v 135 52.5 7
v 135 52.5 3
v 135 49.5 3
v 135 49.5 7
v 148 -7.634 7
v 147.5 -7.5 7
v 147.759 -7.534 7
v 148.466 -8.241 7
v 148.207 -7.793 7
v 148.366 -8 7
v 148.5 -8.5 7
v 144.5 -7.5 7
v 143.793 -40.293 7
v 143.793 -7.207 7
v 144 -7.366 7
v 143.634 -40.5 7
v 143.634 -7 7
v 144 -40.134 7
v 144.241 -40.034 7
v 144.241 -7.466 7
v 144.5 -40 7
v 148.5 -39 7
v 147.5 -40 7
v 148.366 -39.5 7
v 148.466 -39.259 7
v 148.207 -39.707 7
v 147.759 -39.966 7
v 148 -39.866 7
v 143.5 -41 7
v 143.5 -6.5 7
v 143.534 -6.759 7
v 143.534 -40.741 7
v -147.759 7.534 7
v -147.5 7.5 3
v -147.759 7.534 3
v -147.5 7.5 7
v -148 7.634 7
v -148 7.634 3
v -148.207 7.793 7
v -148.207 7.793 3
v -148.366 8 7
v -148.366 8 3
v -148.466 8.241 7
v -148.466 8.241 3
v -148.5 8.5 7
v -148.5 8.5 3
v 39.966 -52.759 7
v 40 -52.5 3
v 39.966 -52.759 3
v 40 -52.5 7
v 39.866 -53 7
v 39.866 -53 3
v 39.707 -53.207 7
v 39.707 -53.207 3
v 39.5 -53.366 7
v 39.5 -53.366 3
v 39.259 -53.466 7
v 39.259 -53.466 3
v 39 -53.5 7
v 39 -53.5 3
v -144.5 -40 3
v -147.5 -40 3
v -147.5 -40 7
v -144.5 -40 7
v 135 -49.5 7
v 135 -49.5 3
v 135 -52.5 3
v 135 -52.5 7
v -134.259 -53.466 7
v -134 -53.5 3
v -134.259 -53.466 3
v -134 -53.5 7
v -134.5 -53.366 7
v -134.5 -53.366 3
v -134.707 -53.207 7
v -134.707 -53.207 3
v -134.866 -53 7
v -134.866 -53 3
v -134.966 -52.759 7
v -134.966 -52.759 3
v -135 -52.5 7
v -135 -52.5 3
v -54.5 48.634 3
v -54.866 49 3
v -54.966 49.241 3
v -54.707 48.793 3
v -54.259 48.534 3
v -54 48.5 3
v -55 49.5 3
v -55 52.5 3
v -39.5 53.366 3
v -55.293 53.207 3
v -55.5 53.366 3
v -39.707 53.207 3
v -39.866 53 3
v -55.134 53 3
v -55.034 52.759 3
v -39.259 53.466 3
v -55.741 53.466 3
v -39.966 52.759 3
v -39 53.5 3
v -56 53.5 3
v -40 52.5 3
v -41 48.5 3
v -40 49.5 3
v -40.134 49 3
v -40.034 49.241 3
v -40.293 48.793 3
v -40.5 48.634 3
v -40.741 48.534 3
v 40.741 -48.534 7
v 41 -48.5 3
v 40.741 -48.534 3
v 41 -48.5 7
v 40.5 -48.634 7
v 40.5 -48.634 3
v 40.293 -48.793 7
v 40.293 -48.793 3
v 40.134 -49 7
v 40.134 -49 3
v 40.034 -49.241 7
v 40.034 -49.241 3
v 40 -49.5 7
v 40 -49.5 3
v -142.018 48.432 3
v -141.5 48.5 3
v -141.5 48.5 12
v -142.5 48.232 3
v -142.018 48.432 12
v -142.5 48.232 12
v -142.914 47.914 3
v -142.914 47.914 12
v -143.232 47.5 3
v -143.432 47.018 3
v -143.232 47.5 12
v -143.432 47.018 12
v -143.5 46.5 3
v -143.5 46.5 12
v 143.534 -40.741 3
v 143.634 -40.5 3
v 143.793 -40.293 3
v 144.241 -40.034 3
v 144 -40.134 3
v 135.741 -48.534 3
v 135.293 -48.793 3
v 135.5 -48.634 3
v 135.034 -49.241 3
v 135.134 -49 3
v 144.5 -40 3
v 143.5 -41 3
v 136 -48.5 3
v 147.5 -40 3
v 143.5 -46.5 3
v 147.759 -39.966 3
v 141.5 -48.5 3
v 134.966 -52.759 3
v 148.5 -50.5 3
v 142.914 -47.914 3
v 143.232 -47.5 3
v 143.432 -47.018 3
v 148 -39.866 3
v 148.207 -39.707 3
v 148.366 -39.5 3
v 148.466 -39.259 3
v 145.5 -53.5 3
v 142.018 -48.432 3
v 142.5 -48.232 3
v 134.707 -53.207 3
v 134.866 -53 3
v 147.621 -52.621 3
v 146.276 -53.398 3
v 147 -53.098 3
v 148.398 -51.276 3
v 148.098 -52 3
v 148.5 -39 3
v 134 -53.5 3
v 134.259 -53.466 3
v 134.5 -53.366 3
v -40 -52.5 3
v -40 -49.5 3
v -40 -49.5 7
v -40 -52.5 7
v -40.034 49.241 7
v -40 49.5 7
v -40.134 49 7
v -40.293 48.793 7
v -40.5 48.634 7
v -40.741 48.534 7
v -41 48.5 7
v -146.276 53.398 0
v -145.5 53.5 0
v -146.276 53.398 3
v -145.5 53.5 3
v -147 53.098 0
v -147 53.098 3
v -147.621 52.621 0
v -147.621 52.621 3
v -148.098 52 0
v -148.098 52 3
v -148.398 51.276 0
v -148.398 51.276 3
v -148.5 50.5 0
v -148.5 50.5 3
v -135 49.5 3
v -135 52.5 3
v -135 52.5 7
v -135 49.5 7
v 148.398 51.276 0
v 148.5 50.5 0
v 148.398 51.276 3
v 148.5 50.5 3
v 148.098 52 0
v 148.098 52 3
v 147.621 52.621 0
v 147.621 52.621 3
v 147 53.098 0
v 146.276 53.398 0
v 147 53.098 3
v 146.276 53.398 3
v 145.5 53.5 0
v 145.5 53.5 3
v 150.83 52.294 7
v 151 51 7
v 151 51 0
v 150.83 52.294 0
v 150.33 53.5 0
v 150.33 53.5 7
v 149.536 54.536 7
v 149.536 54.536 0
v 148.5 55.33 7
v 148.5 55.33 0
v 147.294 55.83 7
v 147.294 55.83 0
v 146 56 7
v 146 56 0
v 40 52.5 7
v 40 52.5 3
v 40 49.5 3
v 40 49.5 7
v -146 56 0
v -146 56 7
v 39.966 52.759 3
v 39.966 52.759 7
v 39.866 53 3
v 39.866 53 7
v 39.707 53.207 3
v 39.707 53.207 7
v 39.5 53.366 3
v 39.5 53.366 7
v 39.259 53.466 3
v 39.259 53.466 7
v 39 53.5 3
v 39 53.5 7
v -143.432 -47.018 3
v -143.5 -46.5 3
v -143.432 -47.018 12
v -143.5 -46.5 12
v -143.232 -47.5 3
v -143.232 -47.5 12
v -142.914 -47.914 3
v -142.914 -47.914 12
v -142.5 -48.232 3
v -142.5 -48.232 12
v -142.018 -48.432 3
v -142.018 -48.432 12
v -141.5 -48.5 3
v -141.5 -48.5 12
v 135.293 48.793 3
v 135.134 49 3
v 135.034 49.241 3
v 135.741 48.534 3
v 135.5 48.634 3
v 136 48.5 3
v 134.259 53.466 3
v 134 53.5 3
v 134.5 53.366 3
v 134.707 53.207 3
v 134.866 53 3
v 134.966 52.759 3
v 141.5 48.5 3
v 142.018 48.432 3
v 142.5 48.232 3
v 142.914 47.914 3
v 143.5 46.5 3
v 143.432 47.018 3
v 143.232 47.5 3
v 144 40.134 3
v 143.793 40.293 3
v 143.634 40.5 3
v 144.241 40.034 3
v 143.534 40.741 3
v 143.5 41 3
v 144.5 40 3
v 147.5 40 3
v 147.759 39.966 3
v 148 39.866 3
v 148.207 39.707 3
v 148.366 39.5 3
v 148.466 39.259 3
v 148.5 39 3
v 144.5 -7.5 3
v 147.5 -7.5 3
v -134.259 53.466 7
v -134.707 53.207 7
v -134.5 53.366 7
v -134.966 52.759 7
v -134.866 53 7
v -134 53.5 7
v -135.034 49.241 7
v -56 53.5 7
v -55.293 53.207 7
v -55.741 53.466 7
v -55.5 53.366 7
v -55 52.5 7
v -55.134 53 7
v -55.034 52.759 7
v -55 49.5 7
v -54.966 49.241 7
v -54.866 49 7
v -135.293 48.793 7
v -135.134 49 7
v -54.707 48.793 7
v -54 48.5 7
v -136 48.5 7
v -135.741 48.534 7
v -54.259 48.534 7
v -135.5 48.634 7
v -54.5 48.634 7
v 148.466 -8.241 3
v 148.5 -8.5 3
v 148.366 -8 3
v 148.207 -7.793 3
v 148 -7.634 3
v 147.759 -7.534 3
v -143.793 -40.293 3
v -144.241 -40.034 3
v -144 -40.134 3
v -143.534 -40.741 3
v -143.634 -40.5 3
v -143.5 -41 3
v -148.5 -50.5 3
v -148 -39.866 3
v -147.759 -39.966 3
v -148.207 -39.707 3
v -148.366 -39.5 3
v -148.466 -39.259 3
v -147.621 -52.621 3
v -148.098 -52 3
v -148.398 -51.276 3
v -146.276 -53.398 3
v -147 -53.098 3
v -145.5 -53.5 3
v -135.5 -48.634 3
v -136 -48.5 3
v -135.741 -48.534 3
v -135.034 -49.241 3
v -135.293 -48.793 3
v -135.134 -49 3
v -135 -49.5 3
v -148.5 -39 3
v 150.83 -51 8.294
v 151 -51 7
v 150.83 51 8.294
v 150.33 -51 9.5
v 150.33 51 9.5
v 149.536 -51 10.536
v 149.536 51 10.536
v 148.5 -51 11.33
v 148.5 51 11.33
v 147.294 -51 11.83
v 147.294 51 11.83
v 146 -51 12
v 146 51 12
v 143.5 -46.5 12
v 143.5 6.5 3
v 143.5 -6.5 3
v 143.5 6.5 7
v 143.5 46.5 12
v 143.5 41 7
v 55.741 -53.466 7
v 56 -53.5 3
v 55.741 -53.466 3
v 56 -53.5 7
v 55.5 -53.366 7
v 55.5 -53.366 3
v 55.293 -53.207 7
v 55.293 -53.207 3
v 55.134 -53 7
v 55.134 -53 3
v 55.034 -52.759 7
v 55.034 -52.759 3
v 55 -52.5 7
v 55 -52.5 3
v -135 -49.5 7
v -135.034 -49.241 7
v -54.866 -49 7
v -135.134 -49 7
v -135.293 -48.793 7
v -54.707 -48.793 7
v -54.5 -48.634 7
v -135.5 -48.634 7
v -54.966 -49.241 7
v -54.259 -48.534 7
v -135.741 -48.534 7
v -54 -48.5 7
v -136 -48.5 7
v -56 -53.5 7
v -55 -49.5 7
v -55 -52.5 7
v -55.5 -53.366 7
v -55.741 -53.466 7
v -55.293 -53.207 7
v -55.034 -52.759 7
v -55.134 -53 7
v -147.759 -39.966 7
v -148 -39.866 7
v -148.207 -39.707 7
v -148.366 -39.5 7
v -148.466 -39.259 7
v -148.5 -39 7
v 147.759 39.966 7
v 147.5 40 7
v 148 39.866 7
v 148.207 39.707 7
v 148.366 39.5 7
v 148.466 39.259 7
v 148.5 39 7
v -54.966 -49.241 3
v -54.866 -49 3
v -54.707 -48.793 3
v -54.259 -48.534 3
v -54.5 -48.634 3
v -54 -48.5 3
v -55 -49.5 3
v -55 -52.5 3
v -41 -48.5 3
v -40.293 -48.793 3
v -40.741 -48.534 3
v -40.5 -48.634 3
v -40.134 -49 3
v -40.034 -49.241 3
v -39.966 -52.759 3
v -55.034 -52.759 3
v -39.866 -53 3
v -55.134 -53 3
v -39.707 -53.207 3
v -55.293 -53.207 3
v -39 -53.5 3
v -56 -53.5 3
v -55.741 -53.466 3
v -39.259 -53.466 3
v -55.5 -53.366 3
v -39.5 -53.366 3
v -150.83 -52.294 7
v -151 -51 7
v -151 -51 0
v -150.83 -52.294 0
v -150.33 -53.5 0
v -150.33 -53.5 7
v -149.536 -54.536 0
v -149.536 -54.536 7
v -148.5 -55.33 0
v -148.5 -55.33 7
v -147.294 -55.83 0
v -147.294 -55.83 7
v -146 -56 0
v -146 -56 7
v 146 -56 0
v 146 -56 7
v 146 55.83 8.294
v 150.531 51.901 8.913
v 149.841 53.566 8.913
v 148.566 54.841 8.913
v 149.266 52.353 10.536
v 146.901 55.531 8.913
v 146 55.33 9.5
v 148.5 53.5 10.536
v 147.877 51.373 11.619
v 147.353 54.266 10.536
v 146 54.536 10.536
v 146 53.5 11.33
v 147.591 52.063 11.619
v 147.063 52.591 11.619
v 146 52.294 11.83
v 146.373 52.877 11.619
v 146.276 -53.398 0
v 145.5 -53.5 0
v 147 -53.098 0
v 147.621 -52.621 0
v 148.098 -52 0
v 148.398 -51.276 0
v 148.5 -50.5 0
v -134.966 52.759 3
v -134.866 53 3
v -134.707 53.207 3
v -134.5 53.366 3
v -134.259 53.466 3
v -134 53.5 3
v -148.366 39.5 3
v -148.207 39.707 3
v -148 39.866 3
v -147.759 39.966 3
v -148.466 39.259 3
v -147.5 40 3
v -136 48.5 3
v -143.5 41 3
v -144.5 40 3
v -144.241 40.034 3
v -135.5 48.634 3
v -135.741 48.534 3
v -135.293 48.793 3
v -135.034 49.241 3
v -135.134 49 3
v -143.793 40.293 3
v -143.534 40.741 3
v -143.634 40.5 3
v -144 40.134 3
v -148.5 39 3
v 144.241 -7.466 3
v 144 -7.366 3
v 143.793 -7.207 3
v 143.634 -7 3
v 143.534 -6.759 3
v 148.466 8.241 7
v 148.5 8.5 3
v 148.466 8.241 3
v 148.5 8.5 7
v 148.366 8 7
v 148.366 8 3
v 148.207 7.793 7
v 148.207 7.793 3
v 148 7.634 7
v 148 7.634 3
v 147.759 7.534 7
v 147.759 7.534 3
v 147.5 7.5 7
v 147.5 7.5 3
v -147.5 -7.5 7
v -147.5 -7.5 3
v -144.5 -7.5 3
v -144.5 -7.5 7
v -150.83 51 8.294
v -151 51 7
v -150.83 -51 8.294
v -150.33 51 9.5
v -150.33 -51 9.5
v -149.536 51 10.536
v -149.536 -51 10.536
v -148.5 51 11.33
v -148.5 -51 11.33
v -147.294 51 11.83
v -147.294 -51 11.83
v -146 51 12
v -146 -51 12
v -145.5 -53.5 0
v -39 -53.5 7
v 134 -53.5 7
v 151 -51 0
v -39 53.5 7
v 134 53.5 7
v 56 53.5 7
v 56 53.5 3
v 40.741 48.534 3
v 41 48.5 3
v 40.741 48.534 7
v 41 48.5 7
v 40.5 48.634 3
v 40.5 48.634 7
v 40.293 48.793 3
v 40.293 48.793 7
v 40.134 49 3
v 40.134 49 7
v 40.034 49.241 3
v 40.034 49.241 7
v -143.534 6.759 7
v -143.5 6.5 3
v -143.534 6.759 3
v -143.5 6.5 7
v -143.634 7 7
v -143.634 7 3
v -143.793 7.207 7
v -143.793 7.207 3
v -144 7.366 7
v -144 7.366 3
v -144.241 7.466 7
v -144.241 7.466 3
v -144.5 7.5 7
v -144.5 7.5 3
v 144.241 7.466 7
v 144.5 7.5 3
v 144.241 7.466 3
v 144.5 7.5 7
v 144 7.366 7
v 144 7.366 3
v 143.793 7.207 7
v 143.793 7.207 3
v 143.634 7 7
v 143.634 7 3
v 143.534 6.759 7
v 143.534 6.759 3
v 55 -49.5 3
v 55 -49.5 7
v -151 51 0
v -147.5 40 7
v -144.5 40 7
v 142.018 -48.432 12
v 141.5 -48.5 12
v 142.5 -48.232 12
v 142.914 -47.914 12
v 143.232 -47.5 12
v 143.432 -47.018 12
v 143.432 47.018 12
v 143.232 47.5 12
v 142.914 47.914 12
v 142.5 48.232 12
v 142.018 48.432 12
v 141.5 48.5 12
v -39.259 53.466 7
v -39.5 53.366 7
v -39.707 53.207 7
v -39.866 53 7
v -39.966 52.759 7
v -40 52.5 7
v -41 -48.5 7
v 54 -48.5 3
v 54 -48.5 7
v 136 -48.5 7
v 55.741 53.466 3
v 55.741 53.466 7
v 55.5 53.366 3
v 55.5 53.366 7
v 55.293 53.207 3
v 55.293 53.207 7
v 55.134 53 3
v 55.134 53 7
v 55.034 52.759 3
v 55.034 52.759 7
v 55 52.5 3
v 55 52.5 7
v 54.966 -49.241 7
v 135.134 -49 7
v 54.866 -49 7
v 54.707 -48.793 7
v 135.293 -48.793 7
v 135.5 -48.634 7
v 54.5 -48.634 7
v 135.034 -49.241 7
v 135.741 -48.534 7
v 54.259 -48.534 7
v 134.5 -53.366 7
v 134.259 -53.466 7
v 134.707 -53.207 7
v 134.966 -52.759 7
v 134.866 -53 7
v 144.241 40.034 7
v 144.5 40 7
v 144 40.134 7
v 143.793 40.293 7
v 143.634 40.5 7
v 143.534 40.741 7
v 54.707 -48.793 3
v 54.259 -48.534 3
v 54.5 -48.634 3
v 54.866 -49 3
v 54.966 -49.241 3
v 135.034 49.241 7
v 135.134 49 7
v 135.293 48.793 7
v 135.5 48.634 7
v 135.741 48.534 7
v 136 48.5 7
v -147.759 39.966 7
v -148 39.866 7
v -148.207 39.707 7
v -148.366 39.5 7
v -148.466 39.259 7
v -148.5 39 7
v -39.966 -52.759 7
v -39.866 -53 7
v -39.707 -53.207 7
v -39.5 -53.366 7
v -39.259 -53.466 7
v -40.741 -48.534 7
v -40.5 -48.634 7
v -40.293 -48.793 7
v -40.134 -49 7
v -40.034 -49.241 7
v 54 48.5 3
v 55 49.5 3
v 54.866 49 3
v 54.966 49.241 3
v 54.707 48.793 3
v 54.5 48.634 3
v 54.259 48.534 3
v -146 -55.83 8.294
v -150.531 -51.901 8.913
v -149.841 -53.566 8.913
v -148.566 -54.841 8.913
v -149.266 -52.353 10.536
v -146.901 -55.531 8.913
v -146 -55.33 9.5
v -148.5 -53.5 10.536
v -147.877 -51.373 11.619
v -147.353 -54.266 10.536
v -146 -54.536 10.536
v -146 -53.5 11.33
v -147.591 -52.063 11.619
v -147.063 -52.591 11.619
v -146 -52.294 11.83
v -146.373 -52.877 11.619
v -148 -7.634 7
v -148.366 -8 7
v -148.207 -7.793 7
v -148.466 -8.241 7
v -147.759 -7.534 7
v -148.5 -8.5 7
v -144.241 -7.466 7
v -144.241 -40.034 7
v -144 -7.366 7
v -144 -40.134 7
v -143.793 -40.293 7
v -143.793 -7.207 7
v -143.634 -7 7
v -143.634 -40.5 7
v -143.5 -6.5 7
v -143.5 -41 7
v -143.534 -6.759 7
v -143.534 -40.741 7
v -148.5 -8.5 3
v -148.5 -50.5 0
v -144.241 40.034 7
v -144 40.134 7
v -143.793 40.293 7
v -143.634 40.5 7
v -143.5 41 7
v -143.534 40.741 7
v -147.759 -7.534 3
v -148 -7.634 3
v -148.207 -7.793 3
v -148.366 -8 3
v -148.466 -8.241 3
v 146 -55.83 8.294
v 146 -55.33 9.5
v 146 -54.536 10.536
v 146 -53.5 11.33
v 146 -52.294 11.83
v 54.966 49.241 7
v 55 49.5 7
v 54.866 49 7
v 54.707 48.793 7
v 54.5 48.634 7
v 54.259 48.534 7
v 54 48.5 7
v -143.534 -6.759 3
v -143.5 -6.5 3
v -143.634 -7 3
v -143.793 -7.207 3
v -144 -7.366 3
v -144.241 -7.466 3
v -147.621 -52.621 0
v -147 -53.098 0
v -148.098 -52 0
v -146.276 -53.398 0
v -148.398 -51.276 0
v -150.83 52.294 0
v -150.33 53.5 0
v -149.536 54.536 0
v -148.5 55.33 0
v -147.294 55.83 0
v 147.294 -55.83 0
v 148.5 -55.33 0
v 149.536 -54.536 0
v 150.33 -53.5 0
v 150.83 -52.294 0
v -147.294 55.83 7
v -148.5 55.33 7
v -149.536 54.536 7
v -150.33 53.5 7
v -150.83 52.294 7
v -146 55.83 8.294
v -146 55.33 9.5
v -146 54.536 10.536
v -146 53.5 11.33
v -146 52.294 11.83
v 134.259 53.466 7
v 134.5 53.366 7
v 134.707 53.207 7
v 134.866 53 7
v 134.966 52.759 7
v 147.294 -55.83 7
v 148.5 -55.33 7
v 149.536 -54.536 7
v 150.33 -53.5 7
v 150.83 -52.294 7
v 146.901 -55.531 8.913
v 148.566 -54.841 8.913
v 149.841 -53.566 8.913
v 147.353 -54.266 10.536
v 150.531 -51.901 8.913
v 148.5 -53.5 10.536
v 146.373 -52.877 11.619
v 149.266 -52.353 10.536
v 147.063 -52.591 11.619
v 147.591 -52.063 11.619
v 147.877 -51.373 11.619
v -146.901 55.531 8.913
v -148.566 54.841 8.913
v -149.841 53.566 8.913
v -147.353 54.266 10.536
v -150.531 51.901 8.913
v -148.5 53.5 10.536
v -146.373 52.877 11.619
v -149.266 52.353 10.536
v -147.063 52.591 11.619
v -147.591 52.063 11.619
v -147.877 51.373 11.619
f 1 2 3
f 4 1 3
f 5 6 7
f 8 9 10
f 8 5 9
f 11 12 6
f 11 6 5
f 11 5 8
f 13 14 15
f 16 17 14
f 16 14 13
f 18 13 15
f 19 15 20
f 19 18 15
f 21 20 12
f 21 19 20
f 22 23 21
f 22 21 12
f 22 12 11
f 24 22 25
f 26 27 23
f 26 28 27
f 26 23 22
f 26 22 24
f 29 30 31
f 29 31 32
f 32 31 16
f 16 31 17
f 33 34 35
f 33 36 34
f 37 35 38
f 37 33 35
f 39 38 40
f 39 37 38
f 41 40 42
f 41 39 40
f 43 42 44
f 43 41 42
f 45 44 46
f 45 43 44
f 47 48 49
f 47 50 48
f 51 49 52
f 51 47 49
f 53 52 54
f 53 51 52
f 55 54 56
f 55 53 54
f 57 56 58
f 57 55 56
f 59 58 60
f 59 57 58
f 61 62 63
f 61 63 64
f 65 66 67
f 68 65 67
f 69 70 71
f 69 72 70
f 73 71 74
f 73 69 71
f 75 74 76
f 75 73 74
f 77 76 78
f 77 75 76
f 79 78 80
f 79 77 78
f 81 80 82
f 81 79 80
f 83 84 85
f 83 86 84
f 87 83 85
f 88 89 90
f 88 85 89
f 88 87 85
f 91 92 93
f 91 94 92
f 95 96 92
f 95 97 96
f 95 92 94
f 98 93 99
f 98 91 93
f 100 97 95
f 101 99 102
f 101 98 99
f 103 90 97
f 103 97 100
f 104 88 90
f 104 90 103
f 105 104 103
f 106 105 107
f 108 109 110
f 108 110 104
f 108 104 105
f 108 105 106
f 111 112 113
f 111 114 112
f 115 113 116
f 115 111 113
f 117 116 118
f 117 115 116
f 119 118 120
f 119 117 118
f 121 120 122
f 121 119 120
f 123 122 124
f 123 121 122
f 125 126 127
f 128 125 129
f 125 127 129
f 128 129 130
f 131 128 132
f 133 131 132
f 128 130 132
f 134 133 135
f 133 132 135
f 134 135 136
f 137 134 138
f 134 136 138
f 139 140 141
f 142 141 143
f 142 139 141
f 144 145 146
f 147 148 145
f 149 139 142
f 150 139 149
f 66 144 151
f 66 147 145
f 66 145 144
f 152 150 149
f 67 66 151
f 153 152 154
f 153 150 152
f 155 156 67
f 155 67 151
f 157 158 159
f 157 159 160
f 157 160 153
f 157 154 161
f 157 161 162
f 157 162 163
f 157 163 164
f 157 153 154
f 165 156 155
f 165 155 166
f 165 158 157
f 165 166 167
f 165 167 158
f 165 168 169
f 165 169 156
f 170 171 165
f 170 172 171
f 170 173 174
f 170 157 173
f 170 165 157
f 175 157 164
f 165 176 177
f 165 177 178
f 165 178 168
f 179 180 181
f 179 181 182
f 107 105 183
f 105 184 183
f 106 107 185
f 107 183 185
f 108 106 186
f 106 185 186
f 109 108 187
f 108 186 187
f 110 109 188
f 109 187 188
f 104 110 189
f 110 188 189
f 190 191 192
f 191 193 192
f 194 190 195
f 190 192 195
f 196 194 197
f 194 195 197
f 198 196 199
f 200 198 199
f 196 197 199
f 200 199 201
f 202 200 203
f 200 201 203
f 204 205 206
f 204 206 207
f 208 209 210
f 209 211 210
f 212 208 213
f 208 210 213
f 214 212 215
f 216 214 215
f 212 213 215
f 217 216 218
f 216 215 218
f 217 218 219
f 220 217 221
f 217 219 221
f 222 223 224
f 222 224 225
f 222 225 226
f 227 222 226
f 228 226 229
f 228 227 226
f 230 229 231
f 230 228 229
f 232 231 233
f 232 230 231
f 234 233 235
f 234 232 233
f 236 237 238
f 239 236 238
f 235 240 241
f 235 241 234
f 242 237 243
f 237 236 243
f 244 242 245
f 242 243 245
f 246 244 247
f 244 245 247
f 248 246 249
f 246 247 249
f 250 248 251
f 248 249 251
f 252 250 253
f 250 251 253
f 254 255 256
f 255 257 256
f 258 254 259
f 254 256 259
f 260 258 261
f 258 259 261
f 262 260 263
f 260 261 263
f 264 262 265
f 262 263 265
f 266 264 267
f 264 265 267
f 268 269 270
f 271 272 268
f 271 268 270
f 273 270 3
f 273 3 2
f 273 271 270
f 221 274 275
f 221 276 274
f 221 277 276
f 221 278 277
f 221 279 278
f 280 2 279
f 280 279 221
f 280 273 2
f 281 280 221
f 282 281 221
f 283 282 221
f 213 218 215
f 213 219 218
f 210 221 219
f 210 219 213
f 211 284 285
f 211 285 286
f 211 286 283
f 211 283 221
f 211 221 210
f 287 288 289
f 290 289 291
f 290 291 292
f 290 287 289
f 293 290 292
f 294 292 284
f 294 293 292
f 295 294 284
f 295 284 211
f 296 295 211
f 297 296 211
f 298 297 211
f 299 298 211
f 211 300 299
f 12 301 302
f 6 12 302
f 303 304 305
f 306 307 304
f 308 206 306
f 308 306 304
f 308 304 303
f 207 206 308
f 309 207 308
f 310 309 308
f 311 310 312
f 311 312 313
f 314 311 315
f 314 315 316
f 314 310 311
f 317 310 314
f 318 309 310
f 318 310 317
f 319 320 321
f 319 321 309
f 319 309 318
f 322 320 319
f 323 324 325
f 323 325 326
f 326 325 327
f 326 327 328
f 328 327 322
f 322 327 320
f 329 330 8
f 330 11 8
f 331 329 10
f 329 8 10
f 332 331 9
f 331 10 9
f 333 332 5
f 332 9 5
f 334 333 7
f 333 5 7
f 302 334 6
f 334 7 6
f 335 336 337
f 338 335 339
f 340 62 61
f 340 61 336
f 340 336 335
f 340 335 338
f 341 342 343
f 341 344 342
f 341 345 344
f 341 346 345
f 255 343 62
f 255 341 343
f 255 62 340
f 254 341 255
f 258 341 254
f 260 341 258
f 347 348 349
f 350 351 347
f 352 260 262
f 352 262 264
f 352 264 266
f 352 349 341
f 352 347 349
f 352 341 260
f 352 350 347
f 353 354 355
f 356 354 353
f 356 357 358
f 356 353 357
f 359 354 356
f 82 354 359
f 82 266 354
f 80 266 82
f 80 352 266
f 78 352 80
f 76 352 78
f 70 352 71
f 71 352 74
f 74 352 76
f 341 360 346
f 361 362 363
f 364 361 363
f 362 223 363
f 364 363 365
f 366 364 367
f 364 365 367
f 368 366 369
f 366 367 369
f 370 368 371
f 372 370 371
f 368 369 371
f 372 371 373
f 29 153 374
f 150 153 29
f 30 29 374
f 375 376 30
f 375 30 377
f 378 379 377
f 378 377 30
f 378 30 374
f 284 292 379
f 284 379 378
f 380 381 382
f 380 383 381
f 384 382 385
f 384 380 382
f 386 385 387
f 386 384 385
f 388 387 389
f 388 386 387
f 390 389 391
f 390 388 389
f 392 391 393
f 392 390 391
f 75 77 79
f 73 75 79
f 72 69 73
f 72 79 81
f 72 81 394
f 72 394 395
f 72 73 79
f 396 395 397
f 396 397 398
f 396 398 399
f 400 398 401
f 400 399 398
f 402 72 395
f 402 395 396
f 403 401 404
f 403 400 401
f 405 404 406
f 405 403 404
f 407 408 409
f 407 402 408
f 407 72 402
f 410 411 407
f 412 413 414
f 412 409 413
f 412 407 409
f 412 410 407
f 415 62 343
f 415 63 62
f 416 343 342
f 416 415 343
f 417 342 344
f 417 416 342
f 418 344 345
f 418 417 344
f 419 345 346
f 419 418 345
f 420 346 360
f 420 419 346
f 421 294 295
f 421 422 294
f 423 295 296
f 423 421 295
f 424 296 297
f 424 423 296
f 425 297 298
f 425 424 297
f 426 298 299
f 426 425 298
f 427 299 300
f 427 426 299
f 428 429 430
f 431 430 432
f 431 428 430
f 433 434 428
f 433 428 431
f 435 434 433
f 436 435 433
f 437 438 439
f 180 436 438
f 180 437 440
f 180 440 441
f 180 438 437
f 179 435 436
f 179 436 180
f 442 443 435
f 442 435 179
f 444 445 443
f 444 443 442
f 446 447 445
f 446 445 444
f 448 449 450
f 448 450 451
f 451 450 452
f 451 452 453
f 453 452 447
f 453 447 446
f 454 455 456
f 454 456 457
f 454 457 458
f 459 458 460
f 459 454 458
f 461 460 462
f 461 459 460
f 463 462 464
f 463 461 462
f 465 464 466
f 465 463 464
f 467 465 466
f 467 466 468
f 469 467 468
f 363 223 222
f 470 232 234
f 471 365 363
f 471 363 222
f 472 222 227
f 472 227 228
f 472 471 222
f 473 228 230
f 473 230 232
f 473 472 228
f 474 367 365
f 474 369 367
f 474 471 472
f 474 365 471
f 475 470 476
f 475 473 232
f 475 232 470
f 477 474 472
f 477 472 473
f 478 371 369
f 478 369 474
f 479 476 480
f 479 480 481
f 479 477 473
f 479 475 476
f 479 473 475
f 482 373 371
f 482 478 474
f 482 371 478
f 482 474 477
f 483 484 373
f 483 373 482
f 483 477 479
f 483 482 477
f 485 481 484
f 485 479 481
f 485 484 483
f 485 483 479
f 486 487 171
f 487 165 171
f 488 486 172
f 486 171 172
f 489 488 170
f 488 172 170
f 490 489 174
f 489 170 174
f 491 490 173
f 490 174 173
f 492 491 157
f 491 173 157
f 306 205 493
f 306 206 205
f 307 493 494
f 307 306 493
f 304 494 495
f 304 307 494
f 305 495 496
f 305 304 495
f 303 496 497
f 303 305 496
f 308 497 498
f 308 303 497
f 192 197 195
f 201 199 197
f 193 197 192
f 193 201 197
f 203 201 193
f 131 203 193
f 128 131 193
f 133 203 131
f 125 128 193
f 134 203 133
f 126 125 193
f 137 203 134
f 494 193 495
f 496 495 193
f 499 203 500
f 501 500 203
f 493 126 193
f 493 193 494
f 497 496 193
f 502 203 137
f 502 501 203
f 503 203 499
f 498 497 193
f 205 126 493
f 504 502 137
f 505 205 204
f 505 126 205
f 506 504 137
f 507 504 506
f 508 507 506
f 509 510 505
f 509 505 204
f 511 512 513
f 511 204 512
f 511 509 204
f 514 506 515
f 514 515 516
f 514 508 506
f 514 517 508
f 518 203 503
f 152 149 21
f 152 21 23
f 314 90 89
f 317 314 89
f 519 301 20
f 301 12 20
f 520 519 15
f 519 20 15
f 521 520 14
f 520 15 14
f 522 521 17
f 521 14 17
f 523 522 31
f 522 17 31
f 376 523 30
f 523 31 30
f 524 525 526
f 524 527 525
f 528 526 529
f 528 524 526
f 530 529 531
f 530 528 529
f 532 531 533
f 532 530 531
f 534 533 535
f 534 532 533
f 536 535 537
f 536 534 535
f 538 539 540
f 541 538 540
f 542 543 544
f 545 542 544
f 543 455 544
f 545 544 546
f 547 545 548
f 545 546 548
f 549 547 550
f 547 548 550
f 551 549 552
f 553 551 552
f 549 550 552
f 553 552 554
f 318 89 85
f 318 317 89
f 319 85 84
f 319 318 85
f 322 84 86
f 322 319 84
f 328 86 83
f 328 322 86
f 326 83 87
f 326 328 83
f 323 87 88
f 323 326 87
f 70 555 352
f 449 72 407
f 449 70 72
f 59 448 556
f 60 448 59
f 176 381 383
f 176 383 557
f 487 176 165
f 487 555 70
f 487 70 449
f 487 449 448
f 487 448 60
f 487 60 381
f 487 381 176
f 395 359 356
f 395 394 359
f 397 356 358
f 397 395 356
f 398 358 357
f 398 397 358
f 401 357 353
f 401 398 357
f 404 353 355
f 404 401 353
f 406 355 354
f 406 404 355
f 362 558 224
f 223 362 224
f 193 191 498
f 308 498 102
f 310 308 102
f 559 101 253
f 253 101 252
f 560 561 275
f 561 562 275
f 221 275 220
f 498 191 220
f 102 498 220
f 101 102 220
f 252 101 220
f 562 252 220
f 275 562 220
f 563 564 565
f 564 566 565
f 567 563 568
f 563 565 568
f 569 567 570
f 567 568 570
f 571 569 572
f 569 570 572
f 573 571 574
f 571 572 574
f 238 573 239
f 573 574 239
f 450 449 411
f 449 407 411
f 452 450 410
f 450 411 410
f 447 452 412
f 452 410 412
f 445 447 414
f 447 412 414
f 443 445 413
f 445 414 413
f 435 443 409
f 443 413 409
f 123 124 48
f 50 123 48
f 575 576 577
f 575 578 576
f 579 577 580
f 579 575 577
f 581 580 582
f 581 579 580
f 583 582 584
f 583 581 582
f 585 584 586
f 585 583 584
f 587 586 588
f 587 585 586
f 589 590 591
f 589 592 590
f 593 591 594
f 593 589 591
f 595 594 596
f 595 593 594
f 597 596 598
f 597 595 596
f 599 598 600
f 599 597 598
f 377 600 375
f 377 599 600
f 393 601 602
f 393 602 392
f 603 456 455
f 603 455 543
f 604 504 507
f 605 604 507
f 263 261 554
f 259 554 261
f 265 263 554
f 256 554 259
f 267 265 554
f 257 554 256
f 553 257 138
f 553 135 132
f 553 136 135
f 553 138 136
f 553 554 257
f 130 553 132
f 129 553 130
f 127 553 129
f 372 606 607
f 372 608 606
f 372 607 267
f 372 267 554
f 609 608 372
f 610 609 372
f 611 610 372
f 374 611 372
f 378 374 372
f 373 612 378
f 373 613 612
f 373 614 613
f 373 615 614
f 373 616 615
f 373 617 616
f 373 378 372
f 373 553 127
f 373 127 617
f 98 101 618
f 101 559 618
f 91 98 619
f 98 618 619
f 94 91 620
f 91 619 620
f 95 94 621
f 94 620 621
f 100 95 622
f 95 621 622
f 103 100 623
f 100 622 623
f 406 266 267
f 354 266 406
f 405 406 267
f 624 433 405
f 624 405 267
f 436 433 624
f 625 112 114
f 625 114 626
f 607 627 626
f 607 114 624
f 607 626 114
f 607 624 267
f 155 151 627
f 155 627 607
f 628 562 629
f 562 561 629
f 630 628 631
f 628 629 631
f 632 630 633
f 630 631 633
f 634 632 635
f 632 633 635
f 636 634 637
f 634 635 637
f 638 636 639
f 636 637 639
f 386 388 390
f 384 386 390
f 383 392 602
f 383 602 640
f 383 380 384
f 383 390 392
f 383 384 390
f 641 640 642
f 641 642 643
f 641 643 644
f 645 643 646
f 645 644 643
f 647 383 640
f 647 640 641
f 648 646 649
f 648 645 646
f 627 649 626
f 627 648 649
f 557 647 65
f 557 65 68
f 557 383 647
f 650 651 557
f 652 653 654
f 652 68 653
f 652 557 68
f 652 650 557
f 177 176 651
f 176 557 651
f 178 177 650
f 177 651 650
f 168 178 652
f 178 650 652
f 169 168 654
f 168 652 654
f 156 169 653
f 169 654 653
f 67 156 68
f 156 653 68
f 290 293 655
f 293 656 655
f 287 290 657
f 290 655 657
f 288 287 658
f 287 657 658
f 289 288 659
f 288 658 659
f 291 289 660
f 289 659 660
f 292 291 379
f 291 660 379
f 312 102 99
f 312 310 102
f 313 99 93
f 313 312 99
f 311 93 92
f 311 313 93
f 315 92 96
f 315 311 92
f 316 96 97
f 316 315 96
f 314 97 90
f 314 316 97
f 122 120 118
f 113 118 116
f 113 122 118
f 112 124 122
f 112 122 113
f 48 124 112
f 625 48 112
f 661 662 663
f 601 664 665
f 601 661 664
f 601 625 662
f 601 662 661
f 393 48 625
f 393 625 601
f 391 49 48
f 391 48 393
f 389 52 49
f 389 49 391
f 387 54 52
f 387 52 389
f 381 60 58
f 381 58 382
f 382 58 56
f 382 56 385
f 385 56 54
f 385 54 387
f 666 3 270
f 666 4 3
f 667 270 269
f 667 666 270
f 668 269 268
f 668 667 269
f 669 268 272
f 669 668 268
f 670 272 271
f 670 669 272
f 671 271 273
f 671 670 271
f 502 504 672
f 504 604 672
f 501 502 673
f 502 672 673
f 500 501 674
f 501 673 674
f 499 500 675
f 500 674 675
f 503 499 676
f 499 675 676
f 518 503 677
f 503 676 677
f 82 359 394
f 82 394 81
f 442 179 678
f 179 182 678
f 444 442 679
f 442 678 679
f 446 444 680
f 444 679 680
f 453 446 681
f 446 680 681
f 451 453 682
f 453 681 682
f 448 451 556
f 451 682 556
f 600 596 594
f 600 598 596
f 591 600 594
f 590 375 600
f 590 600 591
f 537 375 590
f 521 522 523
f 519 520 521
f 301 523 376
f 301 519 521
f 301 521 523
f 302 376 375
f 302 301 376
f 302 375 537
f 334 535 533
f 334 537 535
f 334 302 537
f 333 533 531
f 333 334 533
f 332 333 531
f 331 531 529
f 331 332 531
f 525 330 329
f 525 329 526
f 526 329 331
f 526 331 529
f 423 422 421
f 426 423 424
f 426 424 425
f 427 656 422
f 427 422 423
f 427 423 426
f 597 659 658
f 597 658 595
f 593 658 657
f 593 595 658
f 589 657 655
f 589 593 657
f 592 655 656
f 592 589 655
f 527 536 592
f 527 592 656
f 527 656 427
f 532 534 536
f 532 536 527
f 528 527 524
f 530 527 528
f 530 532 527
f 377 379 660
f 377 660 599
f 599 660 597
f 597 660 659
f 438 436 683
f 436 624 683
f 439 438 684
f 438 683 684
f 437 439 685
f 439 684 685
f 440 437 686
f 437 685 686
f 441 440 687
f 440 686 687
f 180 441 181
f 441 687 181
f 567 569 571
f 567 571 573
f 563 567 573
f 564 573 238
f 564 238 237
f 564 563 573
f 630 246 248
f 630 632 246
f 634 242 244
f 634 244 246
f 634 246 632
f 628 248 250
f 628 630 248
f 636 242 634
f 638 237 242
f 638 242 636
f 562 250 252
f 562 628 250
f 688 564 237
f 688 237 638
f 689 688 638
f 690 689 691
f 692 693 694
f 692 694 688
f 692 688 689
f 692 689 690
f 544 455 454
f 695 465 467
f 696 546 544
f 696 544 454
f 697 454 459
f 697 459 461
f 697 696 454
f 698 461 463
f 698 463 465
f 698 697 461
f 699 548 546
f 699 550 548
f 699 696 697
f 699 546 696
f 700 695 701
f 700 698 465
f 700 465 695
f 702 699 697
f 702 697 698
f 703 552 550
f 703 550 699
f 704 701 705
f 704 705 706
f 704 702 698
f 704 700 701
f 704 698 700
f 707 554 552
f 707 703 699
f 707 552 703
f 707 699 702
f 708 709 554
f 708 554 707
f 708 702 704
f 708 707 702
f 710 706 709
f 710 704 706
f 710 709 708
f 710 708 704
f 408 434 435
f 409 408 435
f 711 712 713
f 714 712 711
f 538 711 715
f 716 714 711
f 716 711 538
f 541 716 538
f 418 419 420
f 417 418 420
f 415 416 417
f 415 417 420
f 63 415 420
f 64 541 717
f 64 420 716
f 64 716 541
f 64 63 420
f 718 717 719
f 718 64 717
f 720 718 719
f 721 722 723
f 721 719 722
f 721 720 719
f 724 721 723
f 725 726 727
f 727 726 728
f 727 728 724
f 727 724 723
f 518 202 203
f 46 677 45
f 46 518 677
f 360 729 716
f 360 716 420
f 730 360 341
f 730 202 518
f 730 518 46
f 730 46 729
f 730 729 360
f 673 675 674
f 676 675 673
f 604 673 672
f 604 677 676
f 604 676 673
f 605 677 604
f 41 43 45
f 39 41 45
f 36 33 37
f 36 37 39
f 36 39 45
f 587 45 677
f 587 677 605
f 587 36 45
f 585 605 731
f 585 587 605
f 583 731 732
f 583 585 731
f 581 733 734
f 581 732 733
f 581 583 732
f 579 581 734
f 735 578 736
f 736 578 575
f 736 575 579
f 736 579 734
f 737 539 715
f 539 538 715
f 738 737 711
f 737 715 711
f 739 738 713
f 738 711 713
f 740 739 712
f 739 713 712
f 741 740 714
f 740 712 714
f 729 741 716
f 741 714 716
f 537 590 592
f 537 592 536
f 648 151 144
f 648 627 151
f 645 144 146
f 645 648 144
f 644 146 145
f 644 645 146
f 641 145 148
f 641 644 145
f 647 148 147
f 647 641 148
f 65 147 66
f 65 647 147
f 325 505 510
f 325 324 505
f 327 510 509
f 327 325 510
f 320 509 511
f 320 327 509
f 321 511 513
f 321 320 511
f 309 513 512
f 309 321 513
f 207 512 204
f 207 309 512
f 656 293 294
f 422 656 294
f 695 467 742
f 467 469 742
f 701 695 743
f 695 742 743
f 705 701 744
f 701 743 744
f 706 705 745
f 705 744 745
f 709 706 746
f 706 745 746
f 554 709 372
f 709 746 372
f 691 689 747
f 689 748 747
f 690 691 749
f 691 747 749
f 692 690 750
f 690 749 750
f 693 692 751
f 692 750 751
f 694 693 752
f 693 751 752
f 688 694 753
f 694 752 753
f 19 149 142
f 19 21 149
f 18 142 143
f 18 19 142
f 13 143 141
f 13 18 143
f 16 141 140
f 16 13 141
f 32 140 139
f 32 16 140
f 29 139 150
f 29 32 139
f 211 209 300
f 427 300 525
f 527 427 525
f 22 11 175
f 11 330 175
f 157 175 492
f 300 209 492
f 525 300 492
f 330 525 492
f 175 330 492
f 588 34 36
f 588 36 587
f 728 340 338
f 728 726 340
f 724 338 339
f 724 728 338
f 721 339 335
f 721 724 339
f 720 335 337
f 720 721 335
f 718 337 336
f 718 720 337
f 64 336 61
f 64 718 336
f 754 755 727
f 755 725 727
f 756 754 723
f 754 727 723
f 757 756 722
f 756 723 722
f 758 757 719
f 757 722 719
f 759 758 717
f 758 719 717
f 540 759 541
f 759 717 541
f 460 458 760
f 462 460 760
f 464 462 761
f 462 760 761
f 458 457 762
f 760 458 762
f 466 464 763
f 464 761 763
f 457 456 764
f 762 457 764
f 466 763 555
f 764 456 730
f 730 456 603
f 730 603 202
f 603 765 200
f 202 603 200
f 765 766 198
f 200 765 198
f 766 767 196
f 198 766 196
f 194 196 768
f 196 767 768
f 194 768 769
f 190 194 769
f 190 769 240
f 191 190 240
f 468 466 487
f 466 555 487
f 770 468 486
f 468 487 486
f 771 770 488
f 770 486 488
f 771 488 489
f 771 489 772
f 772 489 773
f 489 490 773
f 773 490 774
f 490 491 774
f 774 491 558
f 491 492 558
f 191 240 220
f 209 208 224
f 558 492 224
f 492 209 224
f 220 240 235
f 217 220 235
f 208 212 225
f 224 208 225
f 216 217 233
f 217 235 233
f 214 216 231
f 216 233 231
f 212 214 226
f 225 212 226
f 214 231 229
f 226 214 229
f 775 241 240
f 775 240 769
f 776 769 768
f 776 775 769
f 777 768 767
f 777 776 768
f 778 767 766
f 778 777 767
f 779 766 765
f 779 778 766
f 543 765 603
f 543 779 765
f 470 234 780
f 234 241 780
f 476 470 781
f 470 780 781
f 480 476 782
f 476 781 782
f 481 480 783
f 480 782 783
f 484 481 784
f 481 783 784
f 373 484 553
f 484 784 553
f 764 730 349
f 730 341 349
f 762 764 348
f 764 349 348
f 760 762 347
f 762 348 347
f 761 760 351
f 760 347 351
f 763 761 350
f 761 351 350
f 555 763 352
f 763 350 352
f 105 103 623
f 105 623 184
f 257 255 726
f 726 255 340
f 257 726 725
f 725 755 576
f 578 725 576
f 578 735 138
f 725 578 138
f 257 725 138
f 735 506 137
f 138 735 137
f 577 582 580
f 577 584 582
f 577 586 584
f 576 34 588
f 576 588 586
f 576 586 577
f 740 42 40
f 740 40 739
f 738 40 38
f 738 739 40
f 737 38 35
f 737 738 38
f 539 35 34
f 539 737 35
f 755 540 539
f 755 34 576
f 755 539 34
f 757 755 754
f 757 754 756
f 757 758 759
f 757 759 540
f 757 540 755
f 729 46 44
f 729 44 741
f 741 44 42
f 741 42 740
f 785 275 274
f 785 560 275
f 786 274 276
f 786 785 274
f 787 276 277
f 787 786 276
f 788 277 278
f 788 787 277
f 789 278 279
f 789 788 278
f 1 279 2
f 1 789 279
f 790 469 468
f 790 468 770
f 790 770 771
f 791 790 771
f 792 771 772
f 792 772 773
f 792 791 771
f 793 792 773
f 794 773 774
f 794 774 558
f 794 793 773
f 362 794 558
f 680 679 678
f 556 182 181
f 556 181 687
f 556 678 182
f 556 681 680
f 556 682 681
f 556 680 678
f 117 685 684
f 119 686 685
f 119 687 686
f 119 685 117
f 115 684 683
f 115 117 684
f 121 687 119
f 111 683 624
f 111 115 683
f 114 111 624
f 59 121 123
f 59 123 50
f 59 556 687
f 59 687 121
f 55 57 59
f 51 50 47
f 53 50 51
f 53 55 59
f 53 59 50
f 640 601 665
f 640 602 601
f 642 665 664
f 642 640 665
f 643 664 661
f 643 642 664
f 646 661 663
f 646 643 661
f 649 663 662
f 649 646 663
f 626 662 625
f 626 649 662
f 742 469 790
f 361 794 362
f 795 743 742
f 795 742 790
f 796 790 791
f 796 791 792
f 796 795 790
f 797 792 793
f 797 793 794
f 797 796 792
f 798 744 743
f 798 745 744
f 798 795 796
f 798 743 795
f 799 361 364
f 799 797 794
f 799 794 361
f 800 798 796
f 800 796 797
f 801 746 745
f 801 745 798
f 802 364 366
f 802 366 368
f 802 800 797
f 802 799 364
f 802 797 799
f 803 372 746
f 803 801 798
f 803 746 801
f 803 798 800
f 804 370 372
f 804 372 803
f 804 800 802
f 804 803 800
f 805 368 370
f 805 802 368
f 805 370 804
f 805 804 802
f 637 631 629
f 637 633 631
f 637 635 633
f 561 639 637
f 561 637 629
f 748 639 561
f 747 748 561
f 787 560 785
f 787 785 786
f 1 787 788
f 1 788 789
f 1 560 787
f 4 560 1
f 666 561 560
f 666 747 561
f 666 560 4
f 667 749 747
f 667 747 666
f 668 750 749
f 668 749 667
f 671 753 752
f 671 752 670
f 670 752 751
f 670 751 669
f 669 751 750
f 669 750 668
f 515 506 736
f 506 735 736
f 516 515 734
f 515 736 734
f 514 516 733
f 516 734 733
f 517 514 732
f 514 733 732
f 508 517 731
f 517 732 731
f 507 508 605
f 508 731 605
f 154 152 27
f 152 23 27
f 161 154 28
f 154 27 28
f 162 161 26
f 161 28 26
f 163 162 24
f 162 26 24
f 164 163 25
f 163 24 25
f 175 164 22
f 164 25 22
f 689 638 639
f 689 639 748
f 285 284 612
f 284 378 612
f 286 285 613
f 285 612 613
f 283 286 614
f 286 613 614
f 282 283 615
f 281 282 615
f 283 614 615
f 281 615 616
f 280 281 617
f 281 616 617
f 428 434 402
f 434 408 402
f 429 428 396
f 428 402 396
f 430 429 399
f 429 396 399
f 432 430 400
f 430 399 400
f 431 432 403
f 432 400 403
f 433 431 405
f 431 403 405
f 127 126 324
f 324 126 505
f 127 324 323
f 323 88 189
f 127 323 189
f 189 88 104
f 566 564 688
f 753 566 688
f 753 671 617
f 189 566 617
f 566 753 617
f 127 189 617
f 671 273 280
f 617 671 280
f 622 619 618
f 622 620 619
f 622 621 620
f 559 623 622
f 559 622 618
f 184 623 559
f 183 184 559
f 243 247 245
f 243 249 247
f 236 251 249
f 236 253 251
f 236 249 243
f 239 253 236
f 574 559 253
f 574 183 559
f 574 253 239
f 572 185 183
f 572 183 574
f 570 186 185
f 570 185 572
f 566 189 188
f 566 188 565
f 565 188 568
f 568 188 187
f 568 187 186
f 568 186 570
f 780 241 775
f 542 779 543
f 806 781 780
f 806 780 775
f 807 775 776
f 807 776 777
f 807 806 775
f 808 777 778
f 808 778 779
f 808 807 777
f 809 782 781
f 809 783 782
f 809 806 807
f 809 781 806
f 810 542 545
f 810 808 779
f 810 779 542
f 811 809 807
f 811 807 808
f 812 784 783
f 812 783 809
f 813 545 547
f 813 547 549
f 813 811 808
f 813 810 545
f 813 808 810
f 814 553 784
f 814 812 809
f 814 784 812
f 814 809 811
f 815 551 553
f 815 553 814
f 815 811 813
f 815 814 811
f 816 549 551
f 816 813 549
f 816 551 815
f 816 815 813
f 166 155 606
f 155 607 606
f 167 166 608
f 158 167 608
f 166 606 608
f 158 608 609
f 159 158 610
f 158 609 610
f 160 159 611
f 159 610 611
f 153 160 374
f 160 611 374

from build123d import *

# Parameters (mm, degrees)
SKETCH_W        = 302
SKETCH_H        = 112
SKETCH_W_2      = 287
SKETCH_H_2      = 97
PAD_DEPTH       = 12
FILLET_R        = 5
FILLET001_R     = 5
FILLET002_R     = 5
FILLET003_R     = 5
FILLET004_R     = 5
SKETCH001_W     = 297
SKETCH001_H     = 107
POCKET_DEPTH    = 3
FILLET005_R     = 3
FILLET006_R     = 2
FILLET007_R     = 3
FILLET008_R     = 2
FILLET009_R     = 2
FILLET010_R     = 3
FILLET011_R     = 2
FILLET012_R     = 3
SKETCH002_W     = 80
SKETCH002_H     = 5
POCKET001_DEPTH = 4
SKETCH003_W     = 5
SKETCH003_H     = 32.5
POCKET002_DEPTH = 4
FILLET013_R     = 1
FILLET014_R     = 1
FILLET015_R     = 1
FILLET016_R     = 1
FILLET017_R     = 1
FILLET018_R     = 1
FILLET019_R     = 1
FILLET020_R     = 1
FILLET021_R     = 1
FILLET022_R     = 1
FILLET023_R     = 1
FILLET024_R     = 1
FILLET025_R     = 1
FILLET026_R     = 1
FILLET027_R     = 1
FILLET028_R     = 1
FILLET029_R     = 1
FILLET030_R     = 1
FILLET031_R     = 1
FILLET032_R     = 1
FILLET033_R     = 1
FILLET034_R     = 1
FILLET035_R     = 1
FILLET036_R     = 1
FILLET037_R     = 1
FILLET038_R     = 1
FILLET039_R     = 1
FILLET040_R     = 1
FILLET041_R     = 1
FILLET042_R     = 1
FILLET043_R     = 1
FILLET044_R     = 1
FILLET045_R     = 1
FILLET046_R     = 1
FILLET047_R     = 1
FILLET048_R     = 1
FILLET049_R     = 1
FILLET050_R     = 1
FILLET051_R     = 1
FILLET052_R     = 1


with BuildPart() as part:
    # Sketch → Pad (new body)
    with BuildSketch(Plane.XY):
        Rectangle(SKETCH_W, SKETCH_H)
        Rectangle(SKETCH_W_2, SKETCH_H_2, mode=Mode.SUBTRACT)
    extrude(amount=PAD_DEPTH)

    # Fillet
    fillet_edges = [part.edges().sort_by_distance(p)[0] for p in [
        (151, -56, 6),
    ]]
    fillet(fillet_edges, radius=FILLET_R)

    # Fillet001
    fillet001_edges = [part.edges().sort_by_distance(p)[0] for p in [
        (151, 56, 6),
    ]]
    fillet(fillet001_edges, radius=FILLET001_R)

    # Fillet002
    fillet002_edges = [part.edges().sort_by_distance(p)[0] for p in [
        (-151, 56, 6),
    ]]
    fillet(fillet002_edges, radius=FILLET002_R)

    # Fillet003
    fillet003_edges = [part.edges().sort_by_distance(p)[0] for p in [
        (-151, -56, 6),
    ]]
    fillet(fillet003_edges, radius=FILLET003_R)

    # Fillet004
    fillet004_edges = [part.edges().sort_by_distance(p)[0] for p in [
        (149.535534, -54.535534, 12),
    ]]
    fillet(fillet004_edges, radius=FILLET004_R)

    # Sketch001 (on Face4 of Fillet004) → Pocket (cut)
    with BuildSketch(Plane(origin=(0, 0, 0), x_dir=(1, 0, 0), z_dir=(0, 0, -1))):
        Rectangle(SKETCH001_W, SKETCH001_H)
    extrude(amount=-POCKET_DEPTH, mode=Mode.SUBTRACT)

    # Fillet005
    fillet005_edges = [part.edges().sort_by_distance(p)[0] for p in [
        (148.5, -53.5, 1.5),
    ]]
    fillet(fillet005_edges, radius=FILLET005_R)

    # Fillet006
    fillet006_edges = [part.edges().sort_by_distance(p)[0] for p in [
        (143.5, -48.5, 7.5),
    ]]
    fillet(fillet006_edges, radius=FILLET006_R)

    # Fillet007
    fillet007_edges = [part.edges().sort_by_distance(p)[0] for p in [
        (148.5, 53.5, 1.5),
    ]]
    fillet(fillet007_edges, radius=FILLET007_R)

    # Fillet008
    fillet008_edges = [part.edges().sort_by_distance(p)[0] for p in [
        (143.5, 48.5, 7.5),
    ]]
    fillet(fillet008_edges, radius=FILLET008_R)

    # Fillet009
    fillet009_edges = [part.edges().sort_by_distance(p)[0] for p in [
        (-143.5, 48.5, 7.5),
    ]]
    fillet(fillet009_edges, radius=FILLET009_R)

    # Fillet010
    fillet010_edges = [part.edges().sort_by_distance(p)[0] for p in [
        (-148.5, 53.5, 1.5),
    ]]
    fillet(fillet010_edges, radius=FILLET010_R)

    # Fillet011
    fillet011_edges = [part.edges().sort_by_distance(p)[0] for p in [
        (-143.5, -48.5, 7.5),
    ]]
    fillet(fillet011_edges, radius=FILLET011_R)

    # Fillet012
    fillet012_edges = [part.edges().sort_by_distance(p)[0] for p in [
        (-148.5, -53.5, 1.5),
    ]]
    fillet(fillet012_edges, radius=FILLET012_R)

    # Sketch002 (on Face1 of Fillet012) → Pocket001 (cut)
    with BuildSketch(Plane(origin=(0, 0, 3), x_dir=(1, 0, 0), z_dir=(0, 0, -1))):
        with Locations((-95, 51)):
            Rectangle(SKETCH002_W, SKETCH002_H)
        with Locations((0, 51)):
            Rectangle(SKETCH002_W, SKETCH002_H)
        with Locations((95, 51)):
            Rectangle(SKETCH002_W, SKETCH002_H)
        with Locations((95, -51)):
            Rectangle(SKETCH002_W, SKETCH002_H)
        with Locations((0, -51)):
            Rectangle(SKETCH002_W, SKETCH002_H)
        with Locations((-95, -51)):
            Rectangle(SKETCH002_W, SKETCH002_H)
    extrude(amount=-POCKET001_DEPTH, mode=Mode.SUBTRACT)

    # Sketch003 (on Face1 of Pocket001) → Pocket002 (cut)
    with BuildSketch(Plane(origin=(0, 0, 3), x_dir=(1, 0, 0), z_dir=(0, 0, -1))):
        with Locations((-146, 23.75)):
            Rectangle(SKETCH003_W, SKETCH003_H)
        with Locations((-146, -23.75)):
            Rectangle(SKETCH003_W, SKETCH003_H)
        with Locations((146, 23.75)):
            Rectangle(SKETCH003_W, SKETCH003_H)
        with Locations((146, -23.75)):
            Rectangle(SKETCH003_W, SKETCH003_H)
    extrude(amount=-POCKET002_DEPTH, mode=Mode.SUBTRACT)

    # Fillet013
    fillet013_edges = [part.edges().sort_by_distance(p)[0] for p in [
        (-143.5, -40, 5),
    ]]
    fillet(fillet013_edges, radius=FILLET013_R)

    # Fillet014
    fillet014_edges = [part.edges().sort_by_distance(p)[0] for p in [
        (-135, -48.5, 5),
    ]]
    fillet(fillet014_edges, radius=FILLET014_R)

    # Fillet015
    fillet015_edges = [part.edges().sort_by_distance(p)[0] for p in [
        (-135, -53.5, 5),
    ]]
    fillet(fillet015_edges, radius=FILLET015_R)

    # Fillet016
    fillet016_edges = [part.edges().sort_by_distance(p)[0] for p in [
        (-148.5, -40, 5),
    ]]
    fillet(fillet016_edges, radius=FILLET016_R)

    # Fillet017
    fillet017_edges = [part.edges().sort_by_distance(p)[0] for p in [
        (-148.5, 7.5, 5),
    ]]
    fillet(fillet017_edges, radius=FILLET017_R)

    # Fillet018
    fillet018_edges = [part.edges().sort_by_distance(p)[0] for p in [
        (-143.5, 7.5, 5),
    ]]
    fillet(fillet018_edges, radius=FILLET018_R)

    # Fillet019
    fillet019_edges = [part.edges().sort_by_distance(p)[0] for p in [
        (-148.5, -7.5, 5),
    ]]
    fillet(fillet019_edges, radius=FILLET019_R)

    # Fillet020
    fillet020_edges = [part.edges().sort_by_distance(p)[0] for p in [
        (-143.5, -7.5, 5),
    ]]
    fillet(fillet020_edges, radius=FILLET020_R)

    # Fillet021
    fillet021_edges = [part.edges().sort_by_distance(p)[0] for p in [
        (-148.5, 40, 5),
    ]]
    fillet(fillet021_edges, radius=FILLET021_R)

    # Fillet022
    fillet022_edges = [part.edges().sort_by_distance(p)[0] for p in [
        (-143.5, 40, 5),
    ]]
    fillet(fillet022_edges, radius=FILLET022_R)

    # Fillet023
    fillet023_edges = [part.edges().sort_by_distance(p)[0] for p in [
        (-135, 53.5, 5),
    ]]
    fillet(fillet023_edges, radius=FILLET023_R)

    # Fillet024
    fillet024_edges = [part.edges().sort_by_distance(p)[0] for p in [
        (-135, 48.5, 5),
    ]]
    fillet(fillet024_edges, radius=FILLET024_R)

    # Fillet025
    fillet025_edges = [part.edges().sort_by_distance(p)[0] for p in [
        (-40, 48.5, 5),
    ]]
    fillet(fillet025_edges, radius=FILLET025_R)

    # Fillet026
    fillet026_edges = [part.edges().sort_by_distance(p)[0] for p in [
        (-40, 53.5, 5),
    ]]
    fillet(fillet026_edges, radius=FILLET026_R)

    # Fillet027
    fillet027_edges = [part.edges().sort_by_distance(p)[0] for p in [
        (-55, 48.5, 5),
    ]]
    fillet(fillet027_edges, radius=FILLET027_R)

    # Fillet028
    fillet028_edges = [part.edges().sort_by_distance(p)[0] for p in [
        (-55, 53.5, 5),
    ]]
    fillet(fillet028_edges, radius=FILLET028_R)

    # Fillet029
    fillet029_edges = [part.edges().sort_by_distance(p)[0] for p in [
        (40, 53.5, 5),
    ]]
    fillet(fillet029_edges, radius=FILLET029_R)

    # Fillet030
    fillet030_edges = [part.edges().sort_by_distance(p)[0] for p in [
        (40, 48.5, 5),
    ]]
    fillet(fillet030_edges, radius=FILLET030_R)

    # Fillet031
    fillet031_edges = [part.edges().sort_by_distance(p)[0] for p in [
        (55, 48.5, 5),
    ]]
    fillet(fillet031_edges, radius=FILLET031_R)

    # Fillet032
    fillet032_edges = [part.edges().sort_by_distance(p)[0] for p in [
        (55, 53.5, 5),
    ]]
    fillet(fillet032_edges, radius=FILLET032_R)

    # Fillet033
    fillet033_edges = [part.edges().sort_by_distance(p)[0] for p in [
        (143.5, 40, 5),
    ]]
    fillet(fillet033_edges, radius=FILLET033_R)

    # Fillet034
    fillet034_edges = [part.edges().sort_by_distance(p)[0] for p in [
        (135, 48.5, 5),
    ]]
    fillet(fillet034_edges, radius=FILLET034_R)

    # Fillet035
    fillet035_edges = [part.edges().sort_by_distance(p)[0] for p in [
        (135, 53.5, 5),
    ]]
    fillet(fillet035_edges, radius=FILLET035_R)

    # Fillet036
    fillet036_edges = [part.edges().sort_by_distance(p)[0] for p in [
        (148.5, 40, 5),
    ]]
    fillet(fillet036_edges, radius=FILLET036_R)

    # Fillet037
    fillet037_edges = [part.edges().sort_by_distance(p)[0] for p in [
        (143.5, -7.5, 5),
    ]]
    fillet(fillet037_edges, radius=FILLET037_R)

    # Fillet038
    fillet038_edges = [part.edges().sort_by_distance(p)[0] for p in [
        (148.5, -7.5, 5),
    ]]
    fillet(fillet038_edges, radius=FILLET038_R)

    # Fillet039
    fillet039_edges = [part.edges().sort_by_distance(p)[0] for p in [
        (143.5, -40, 5),
    ]]
    fillet(fillet039_edges, radius=FILLET039_R)

    # Fillet040
    fillet040_edges = [part.edges().sort_by_distance(p)[0] for p in [
        (143.5, 7.5, 5),
    ]]
    fillet(fillet040_edges, radius=FILLET040_R)

    # Fillet041
    fillet041_edges = [part.edges().sort_by_distance(p)[0] for p in [
        (148.5, 7.5, 5),
    ]]
    fillet(fillet041_edges, radius=FILLET041_R)

    # Fillet042
    fillet042_edges = [part.edges().sort_by_distance(p)[0] for p in [
        (148.5, -40, 5),
    ]]
    fillet(fillet042_edges, radius=FILLET042_R)

    # Fillet043
    fillet043_edges = [part.edges().sort_by_distance(p)[0] for p in [
        (135, -48.5, 5),
    ]]
    fillet(fillet043_edges, radius=FILLET043_R)

    # Fillet044
    fillet044_edges = [part.edges().sort_by_distance(p)[0] for p in [
        (135, -53.5, 5),
    ]]
    fillet(fillet044_edges, radius=FILLET044_R)

    # Fillet045
    fillet045_edges = [part.edges().sort_by_distance(p)[0] for p in [
        (40, -53.5, 5),
    ]]
    fillet(fillet045_edges, radius=FILLET045_R)

    # Fillet046
    fillet046_edges = [part.edges().sort_by_distance(p)[0] for p in [
        (40, -48.5, 5),
    ]]
    fillet(fillet046_edges, radius=FILLET046_R)

    # Fillet047
    fillet047_edges = [part.edges().sort_by_distance(p)[0] for p in [
        (55, -48.5, 5),
    ]]
    fillet(fillet047_edges, radius=FILLET047_R)

    # Fillet048
    fillet048_edges = [part.edges().sort_by_distance(p)[0] for p in [
        (55, -53.5, 5),
    ]]
    fillet(fillet048_edges, radius=FILLET048_R)

    # Fillet049
    fillet049_edges = [part.edges().sort_by_distance(p)[0] for p in [
        (-40, -53.5, 5),
    ]]
    fillet(fillet049_edges, radius=FILLET049_R)

    # Fillet050
    fillet050_edges = [part.edges().sort_by_distance(p)[0] for p in [
        (-40, -48.5, 5),
    ]]
    fillet(fillet050_edges, radius=FILLET050_R)

    # Fillet051
    fillet051_edges = [part.edges().sort_by_distance(p)[0] for p in [
        (-55, -48.5, 5),
    ]]
    fillet(fillet051_edges, radius=FILLET051_R)

    # Fillet052
    fillet052_edges = [part.edges().sort_by_distance(p)[0] for p in [
        (-55, -53.5, 5),
    ]]
    fillet(fillet052_edges, radius=FILLET052_R)


solid = part.part
